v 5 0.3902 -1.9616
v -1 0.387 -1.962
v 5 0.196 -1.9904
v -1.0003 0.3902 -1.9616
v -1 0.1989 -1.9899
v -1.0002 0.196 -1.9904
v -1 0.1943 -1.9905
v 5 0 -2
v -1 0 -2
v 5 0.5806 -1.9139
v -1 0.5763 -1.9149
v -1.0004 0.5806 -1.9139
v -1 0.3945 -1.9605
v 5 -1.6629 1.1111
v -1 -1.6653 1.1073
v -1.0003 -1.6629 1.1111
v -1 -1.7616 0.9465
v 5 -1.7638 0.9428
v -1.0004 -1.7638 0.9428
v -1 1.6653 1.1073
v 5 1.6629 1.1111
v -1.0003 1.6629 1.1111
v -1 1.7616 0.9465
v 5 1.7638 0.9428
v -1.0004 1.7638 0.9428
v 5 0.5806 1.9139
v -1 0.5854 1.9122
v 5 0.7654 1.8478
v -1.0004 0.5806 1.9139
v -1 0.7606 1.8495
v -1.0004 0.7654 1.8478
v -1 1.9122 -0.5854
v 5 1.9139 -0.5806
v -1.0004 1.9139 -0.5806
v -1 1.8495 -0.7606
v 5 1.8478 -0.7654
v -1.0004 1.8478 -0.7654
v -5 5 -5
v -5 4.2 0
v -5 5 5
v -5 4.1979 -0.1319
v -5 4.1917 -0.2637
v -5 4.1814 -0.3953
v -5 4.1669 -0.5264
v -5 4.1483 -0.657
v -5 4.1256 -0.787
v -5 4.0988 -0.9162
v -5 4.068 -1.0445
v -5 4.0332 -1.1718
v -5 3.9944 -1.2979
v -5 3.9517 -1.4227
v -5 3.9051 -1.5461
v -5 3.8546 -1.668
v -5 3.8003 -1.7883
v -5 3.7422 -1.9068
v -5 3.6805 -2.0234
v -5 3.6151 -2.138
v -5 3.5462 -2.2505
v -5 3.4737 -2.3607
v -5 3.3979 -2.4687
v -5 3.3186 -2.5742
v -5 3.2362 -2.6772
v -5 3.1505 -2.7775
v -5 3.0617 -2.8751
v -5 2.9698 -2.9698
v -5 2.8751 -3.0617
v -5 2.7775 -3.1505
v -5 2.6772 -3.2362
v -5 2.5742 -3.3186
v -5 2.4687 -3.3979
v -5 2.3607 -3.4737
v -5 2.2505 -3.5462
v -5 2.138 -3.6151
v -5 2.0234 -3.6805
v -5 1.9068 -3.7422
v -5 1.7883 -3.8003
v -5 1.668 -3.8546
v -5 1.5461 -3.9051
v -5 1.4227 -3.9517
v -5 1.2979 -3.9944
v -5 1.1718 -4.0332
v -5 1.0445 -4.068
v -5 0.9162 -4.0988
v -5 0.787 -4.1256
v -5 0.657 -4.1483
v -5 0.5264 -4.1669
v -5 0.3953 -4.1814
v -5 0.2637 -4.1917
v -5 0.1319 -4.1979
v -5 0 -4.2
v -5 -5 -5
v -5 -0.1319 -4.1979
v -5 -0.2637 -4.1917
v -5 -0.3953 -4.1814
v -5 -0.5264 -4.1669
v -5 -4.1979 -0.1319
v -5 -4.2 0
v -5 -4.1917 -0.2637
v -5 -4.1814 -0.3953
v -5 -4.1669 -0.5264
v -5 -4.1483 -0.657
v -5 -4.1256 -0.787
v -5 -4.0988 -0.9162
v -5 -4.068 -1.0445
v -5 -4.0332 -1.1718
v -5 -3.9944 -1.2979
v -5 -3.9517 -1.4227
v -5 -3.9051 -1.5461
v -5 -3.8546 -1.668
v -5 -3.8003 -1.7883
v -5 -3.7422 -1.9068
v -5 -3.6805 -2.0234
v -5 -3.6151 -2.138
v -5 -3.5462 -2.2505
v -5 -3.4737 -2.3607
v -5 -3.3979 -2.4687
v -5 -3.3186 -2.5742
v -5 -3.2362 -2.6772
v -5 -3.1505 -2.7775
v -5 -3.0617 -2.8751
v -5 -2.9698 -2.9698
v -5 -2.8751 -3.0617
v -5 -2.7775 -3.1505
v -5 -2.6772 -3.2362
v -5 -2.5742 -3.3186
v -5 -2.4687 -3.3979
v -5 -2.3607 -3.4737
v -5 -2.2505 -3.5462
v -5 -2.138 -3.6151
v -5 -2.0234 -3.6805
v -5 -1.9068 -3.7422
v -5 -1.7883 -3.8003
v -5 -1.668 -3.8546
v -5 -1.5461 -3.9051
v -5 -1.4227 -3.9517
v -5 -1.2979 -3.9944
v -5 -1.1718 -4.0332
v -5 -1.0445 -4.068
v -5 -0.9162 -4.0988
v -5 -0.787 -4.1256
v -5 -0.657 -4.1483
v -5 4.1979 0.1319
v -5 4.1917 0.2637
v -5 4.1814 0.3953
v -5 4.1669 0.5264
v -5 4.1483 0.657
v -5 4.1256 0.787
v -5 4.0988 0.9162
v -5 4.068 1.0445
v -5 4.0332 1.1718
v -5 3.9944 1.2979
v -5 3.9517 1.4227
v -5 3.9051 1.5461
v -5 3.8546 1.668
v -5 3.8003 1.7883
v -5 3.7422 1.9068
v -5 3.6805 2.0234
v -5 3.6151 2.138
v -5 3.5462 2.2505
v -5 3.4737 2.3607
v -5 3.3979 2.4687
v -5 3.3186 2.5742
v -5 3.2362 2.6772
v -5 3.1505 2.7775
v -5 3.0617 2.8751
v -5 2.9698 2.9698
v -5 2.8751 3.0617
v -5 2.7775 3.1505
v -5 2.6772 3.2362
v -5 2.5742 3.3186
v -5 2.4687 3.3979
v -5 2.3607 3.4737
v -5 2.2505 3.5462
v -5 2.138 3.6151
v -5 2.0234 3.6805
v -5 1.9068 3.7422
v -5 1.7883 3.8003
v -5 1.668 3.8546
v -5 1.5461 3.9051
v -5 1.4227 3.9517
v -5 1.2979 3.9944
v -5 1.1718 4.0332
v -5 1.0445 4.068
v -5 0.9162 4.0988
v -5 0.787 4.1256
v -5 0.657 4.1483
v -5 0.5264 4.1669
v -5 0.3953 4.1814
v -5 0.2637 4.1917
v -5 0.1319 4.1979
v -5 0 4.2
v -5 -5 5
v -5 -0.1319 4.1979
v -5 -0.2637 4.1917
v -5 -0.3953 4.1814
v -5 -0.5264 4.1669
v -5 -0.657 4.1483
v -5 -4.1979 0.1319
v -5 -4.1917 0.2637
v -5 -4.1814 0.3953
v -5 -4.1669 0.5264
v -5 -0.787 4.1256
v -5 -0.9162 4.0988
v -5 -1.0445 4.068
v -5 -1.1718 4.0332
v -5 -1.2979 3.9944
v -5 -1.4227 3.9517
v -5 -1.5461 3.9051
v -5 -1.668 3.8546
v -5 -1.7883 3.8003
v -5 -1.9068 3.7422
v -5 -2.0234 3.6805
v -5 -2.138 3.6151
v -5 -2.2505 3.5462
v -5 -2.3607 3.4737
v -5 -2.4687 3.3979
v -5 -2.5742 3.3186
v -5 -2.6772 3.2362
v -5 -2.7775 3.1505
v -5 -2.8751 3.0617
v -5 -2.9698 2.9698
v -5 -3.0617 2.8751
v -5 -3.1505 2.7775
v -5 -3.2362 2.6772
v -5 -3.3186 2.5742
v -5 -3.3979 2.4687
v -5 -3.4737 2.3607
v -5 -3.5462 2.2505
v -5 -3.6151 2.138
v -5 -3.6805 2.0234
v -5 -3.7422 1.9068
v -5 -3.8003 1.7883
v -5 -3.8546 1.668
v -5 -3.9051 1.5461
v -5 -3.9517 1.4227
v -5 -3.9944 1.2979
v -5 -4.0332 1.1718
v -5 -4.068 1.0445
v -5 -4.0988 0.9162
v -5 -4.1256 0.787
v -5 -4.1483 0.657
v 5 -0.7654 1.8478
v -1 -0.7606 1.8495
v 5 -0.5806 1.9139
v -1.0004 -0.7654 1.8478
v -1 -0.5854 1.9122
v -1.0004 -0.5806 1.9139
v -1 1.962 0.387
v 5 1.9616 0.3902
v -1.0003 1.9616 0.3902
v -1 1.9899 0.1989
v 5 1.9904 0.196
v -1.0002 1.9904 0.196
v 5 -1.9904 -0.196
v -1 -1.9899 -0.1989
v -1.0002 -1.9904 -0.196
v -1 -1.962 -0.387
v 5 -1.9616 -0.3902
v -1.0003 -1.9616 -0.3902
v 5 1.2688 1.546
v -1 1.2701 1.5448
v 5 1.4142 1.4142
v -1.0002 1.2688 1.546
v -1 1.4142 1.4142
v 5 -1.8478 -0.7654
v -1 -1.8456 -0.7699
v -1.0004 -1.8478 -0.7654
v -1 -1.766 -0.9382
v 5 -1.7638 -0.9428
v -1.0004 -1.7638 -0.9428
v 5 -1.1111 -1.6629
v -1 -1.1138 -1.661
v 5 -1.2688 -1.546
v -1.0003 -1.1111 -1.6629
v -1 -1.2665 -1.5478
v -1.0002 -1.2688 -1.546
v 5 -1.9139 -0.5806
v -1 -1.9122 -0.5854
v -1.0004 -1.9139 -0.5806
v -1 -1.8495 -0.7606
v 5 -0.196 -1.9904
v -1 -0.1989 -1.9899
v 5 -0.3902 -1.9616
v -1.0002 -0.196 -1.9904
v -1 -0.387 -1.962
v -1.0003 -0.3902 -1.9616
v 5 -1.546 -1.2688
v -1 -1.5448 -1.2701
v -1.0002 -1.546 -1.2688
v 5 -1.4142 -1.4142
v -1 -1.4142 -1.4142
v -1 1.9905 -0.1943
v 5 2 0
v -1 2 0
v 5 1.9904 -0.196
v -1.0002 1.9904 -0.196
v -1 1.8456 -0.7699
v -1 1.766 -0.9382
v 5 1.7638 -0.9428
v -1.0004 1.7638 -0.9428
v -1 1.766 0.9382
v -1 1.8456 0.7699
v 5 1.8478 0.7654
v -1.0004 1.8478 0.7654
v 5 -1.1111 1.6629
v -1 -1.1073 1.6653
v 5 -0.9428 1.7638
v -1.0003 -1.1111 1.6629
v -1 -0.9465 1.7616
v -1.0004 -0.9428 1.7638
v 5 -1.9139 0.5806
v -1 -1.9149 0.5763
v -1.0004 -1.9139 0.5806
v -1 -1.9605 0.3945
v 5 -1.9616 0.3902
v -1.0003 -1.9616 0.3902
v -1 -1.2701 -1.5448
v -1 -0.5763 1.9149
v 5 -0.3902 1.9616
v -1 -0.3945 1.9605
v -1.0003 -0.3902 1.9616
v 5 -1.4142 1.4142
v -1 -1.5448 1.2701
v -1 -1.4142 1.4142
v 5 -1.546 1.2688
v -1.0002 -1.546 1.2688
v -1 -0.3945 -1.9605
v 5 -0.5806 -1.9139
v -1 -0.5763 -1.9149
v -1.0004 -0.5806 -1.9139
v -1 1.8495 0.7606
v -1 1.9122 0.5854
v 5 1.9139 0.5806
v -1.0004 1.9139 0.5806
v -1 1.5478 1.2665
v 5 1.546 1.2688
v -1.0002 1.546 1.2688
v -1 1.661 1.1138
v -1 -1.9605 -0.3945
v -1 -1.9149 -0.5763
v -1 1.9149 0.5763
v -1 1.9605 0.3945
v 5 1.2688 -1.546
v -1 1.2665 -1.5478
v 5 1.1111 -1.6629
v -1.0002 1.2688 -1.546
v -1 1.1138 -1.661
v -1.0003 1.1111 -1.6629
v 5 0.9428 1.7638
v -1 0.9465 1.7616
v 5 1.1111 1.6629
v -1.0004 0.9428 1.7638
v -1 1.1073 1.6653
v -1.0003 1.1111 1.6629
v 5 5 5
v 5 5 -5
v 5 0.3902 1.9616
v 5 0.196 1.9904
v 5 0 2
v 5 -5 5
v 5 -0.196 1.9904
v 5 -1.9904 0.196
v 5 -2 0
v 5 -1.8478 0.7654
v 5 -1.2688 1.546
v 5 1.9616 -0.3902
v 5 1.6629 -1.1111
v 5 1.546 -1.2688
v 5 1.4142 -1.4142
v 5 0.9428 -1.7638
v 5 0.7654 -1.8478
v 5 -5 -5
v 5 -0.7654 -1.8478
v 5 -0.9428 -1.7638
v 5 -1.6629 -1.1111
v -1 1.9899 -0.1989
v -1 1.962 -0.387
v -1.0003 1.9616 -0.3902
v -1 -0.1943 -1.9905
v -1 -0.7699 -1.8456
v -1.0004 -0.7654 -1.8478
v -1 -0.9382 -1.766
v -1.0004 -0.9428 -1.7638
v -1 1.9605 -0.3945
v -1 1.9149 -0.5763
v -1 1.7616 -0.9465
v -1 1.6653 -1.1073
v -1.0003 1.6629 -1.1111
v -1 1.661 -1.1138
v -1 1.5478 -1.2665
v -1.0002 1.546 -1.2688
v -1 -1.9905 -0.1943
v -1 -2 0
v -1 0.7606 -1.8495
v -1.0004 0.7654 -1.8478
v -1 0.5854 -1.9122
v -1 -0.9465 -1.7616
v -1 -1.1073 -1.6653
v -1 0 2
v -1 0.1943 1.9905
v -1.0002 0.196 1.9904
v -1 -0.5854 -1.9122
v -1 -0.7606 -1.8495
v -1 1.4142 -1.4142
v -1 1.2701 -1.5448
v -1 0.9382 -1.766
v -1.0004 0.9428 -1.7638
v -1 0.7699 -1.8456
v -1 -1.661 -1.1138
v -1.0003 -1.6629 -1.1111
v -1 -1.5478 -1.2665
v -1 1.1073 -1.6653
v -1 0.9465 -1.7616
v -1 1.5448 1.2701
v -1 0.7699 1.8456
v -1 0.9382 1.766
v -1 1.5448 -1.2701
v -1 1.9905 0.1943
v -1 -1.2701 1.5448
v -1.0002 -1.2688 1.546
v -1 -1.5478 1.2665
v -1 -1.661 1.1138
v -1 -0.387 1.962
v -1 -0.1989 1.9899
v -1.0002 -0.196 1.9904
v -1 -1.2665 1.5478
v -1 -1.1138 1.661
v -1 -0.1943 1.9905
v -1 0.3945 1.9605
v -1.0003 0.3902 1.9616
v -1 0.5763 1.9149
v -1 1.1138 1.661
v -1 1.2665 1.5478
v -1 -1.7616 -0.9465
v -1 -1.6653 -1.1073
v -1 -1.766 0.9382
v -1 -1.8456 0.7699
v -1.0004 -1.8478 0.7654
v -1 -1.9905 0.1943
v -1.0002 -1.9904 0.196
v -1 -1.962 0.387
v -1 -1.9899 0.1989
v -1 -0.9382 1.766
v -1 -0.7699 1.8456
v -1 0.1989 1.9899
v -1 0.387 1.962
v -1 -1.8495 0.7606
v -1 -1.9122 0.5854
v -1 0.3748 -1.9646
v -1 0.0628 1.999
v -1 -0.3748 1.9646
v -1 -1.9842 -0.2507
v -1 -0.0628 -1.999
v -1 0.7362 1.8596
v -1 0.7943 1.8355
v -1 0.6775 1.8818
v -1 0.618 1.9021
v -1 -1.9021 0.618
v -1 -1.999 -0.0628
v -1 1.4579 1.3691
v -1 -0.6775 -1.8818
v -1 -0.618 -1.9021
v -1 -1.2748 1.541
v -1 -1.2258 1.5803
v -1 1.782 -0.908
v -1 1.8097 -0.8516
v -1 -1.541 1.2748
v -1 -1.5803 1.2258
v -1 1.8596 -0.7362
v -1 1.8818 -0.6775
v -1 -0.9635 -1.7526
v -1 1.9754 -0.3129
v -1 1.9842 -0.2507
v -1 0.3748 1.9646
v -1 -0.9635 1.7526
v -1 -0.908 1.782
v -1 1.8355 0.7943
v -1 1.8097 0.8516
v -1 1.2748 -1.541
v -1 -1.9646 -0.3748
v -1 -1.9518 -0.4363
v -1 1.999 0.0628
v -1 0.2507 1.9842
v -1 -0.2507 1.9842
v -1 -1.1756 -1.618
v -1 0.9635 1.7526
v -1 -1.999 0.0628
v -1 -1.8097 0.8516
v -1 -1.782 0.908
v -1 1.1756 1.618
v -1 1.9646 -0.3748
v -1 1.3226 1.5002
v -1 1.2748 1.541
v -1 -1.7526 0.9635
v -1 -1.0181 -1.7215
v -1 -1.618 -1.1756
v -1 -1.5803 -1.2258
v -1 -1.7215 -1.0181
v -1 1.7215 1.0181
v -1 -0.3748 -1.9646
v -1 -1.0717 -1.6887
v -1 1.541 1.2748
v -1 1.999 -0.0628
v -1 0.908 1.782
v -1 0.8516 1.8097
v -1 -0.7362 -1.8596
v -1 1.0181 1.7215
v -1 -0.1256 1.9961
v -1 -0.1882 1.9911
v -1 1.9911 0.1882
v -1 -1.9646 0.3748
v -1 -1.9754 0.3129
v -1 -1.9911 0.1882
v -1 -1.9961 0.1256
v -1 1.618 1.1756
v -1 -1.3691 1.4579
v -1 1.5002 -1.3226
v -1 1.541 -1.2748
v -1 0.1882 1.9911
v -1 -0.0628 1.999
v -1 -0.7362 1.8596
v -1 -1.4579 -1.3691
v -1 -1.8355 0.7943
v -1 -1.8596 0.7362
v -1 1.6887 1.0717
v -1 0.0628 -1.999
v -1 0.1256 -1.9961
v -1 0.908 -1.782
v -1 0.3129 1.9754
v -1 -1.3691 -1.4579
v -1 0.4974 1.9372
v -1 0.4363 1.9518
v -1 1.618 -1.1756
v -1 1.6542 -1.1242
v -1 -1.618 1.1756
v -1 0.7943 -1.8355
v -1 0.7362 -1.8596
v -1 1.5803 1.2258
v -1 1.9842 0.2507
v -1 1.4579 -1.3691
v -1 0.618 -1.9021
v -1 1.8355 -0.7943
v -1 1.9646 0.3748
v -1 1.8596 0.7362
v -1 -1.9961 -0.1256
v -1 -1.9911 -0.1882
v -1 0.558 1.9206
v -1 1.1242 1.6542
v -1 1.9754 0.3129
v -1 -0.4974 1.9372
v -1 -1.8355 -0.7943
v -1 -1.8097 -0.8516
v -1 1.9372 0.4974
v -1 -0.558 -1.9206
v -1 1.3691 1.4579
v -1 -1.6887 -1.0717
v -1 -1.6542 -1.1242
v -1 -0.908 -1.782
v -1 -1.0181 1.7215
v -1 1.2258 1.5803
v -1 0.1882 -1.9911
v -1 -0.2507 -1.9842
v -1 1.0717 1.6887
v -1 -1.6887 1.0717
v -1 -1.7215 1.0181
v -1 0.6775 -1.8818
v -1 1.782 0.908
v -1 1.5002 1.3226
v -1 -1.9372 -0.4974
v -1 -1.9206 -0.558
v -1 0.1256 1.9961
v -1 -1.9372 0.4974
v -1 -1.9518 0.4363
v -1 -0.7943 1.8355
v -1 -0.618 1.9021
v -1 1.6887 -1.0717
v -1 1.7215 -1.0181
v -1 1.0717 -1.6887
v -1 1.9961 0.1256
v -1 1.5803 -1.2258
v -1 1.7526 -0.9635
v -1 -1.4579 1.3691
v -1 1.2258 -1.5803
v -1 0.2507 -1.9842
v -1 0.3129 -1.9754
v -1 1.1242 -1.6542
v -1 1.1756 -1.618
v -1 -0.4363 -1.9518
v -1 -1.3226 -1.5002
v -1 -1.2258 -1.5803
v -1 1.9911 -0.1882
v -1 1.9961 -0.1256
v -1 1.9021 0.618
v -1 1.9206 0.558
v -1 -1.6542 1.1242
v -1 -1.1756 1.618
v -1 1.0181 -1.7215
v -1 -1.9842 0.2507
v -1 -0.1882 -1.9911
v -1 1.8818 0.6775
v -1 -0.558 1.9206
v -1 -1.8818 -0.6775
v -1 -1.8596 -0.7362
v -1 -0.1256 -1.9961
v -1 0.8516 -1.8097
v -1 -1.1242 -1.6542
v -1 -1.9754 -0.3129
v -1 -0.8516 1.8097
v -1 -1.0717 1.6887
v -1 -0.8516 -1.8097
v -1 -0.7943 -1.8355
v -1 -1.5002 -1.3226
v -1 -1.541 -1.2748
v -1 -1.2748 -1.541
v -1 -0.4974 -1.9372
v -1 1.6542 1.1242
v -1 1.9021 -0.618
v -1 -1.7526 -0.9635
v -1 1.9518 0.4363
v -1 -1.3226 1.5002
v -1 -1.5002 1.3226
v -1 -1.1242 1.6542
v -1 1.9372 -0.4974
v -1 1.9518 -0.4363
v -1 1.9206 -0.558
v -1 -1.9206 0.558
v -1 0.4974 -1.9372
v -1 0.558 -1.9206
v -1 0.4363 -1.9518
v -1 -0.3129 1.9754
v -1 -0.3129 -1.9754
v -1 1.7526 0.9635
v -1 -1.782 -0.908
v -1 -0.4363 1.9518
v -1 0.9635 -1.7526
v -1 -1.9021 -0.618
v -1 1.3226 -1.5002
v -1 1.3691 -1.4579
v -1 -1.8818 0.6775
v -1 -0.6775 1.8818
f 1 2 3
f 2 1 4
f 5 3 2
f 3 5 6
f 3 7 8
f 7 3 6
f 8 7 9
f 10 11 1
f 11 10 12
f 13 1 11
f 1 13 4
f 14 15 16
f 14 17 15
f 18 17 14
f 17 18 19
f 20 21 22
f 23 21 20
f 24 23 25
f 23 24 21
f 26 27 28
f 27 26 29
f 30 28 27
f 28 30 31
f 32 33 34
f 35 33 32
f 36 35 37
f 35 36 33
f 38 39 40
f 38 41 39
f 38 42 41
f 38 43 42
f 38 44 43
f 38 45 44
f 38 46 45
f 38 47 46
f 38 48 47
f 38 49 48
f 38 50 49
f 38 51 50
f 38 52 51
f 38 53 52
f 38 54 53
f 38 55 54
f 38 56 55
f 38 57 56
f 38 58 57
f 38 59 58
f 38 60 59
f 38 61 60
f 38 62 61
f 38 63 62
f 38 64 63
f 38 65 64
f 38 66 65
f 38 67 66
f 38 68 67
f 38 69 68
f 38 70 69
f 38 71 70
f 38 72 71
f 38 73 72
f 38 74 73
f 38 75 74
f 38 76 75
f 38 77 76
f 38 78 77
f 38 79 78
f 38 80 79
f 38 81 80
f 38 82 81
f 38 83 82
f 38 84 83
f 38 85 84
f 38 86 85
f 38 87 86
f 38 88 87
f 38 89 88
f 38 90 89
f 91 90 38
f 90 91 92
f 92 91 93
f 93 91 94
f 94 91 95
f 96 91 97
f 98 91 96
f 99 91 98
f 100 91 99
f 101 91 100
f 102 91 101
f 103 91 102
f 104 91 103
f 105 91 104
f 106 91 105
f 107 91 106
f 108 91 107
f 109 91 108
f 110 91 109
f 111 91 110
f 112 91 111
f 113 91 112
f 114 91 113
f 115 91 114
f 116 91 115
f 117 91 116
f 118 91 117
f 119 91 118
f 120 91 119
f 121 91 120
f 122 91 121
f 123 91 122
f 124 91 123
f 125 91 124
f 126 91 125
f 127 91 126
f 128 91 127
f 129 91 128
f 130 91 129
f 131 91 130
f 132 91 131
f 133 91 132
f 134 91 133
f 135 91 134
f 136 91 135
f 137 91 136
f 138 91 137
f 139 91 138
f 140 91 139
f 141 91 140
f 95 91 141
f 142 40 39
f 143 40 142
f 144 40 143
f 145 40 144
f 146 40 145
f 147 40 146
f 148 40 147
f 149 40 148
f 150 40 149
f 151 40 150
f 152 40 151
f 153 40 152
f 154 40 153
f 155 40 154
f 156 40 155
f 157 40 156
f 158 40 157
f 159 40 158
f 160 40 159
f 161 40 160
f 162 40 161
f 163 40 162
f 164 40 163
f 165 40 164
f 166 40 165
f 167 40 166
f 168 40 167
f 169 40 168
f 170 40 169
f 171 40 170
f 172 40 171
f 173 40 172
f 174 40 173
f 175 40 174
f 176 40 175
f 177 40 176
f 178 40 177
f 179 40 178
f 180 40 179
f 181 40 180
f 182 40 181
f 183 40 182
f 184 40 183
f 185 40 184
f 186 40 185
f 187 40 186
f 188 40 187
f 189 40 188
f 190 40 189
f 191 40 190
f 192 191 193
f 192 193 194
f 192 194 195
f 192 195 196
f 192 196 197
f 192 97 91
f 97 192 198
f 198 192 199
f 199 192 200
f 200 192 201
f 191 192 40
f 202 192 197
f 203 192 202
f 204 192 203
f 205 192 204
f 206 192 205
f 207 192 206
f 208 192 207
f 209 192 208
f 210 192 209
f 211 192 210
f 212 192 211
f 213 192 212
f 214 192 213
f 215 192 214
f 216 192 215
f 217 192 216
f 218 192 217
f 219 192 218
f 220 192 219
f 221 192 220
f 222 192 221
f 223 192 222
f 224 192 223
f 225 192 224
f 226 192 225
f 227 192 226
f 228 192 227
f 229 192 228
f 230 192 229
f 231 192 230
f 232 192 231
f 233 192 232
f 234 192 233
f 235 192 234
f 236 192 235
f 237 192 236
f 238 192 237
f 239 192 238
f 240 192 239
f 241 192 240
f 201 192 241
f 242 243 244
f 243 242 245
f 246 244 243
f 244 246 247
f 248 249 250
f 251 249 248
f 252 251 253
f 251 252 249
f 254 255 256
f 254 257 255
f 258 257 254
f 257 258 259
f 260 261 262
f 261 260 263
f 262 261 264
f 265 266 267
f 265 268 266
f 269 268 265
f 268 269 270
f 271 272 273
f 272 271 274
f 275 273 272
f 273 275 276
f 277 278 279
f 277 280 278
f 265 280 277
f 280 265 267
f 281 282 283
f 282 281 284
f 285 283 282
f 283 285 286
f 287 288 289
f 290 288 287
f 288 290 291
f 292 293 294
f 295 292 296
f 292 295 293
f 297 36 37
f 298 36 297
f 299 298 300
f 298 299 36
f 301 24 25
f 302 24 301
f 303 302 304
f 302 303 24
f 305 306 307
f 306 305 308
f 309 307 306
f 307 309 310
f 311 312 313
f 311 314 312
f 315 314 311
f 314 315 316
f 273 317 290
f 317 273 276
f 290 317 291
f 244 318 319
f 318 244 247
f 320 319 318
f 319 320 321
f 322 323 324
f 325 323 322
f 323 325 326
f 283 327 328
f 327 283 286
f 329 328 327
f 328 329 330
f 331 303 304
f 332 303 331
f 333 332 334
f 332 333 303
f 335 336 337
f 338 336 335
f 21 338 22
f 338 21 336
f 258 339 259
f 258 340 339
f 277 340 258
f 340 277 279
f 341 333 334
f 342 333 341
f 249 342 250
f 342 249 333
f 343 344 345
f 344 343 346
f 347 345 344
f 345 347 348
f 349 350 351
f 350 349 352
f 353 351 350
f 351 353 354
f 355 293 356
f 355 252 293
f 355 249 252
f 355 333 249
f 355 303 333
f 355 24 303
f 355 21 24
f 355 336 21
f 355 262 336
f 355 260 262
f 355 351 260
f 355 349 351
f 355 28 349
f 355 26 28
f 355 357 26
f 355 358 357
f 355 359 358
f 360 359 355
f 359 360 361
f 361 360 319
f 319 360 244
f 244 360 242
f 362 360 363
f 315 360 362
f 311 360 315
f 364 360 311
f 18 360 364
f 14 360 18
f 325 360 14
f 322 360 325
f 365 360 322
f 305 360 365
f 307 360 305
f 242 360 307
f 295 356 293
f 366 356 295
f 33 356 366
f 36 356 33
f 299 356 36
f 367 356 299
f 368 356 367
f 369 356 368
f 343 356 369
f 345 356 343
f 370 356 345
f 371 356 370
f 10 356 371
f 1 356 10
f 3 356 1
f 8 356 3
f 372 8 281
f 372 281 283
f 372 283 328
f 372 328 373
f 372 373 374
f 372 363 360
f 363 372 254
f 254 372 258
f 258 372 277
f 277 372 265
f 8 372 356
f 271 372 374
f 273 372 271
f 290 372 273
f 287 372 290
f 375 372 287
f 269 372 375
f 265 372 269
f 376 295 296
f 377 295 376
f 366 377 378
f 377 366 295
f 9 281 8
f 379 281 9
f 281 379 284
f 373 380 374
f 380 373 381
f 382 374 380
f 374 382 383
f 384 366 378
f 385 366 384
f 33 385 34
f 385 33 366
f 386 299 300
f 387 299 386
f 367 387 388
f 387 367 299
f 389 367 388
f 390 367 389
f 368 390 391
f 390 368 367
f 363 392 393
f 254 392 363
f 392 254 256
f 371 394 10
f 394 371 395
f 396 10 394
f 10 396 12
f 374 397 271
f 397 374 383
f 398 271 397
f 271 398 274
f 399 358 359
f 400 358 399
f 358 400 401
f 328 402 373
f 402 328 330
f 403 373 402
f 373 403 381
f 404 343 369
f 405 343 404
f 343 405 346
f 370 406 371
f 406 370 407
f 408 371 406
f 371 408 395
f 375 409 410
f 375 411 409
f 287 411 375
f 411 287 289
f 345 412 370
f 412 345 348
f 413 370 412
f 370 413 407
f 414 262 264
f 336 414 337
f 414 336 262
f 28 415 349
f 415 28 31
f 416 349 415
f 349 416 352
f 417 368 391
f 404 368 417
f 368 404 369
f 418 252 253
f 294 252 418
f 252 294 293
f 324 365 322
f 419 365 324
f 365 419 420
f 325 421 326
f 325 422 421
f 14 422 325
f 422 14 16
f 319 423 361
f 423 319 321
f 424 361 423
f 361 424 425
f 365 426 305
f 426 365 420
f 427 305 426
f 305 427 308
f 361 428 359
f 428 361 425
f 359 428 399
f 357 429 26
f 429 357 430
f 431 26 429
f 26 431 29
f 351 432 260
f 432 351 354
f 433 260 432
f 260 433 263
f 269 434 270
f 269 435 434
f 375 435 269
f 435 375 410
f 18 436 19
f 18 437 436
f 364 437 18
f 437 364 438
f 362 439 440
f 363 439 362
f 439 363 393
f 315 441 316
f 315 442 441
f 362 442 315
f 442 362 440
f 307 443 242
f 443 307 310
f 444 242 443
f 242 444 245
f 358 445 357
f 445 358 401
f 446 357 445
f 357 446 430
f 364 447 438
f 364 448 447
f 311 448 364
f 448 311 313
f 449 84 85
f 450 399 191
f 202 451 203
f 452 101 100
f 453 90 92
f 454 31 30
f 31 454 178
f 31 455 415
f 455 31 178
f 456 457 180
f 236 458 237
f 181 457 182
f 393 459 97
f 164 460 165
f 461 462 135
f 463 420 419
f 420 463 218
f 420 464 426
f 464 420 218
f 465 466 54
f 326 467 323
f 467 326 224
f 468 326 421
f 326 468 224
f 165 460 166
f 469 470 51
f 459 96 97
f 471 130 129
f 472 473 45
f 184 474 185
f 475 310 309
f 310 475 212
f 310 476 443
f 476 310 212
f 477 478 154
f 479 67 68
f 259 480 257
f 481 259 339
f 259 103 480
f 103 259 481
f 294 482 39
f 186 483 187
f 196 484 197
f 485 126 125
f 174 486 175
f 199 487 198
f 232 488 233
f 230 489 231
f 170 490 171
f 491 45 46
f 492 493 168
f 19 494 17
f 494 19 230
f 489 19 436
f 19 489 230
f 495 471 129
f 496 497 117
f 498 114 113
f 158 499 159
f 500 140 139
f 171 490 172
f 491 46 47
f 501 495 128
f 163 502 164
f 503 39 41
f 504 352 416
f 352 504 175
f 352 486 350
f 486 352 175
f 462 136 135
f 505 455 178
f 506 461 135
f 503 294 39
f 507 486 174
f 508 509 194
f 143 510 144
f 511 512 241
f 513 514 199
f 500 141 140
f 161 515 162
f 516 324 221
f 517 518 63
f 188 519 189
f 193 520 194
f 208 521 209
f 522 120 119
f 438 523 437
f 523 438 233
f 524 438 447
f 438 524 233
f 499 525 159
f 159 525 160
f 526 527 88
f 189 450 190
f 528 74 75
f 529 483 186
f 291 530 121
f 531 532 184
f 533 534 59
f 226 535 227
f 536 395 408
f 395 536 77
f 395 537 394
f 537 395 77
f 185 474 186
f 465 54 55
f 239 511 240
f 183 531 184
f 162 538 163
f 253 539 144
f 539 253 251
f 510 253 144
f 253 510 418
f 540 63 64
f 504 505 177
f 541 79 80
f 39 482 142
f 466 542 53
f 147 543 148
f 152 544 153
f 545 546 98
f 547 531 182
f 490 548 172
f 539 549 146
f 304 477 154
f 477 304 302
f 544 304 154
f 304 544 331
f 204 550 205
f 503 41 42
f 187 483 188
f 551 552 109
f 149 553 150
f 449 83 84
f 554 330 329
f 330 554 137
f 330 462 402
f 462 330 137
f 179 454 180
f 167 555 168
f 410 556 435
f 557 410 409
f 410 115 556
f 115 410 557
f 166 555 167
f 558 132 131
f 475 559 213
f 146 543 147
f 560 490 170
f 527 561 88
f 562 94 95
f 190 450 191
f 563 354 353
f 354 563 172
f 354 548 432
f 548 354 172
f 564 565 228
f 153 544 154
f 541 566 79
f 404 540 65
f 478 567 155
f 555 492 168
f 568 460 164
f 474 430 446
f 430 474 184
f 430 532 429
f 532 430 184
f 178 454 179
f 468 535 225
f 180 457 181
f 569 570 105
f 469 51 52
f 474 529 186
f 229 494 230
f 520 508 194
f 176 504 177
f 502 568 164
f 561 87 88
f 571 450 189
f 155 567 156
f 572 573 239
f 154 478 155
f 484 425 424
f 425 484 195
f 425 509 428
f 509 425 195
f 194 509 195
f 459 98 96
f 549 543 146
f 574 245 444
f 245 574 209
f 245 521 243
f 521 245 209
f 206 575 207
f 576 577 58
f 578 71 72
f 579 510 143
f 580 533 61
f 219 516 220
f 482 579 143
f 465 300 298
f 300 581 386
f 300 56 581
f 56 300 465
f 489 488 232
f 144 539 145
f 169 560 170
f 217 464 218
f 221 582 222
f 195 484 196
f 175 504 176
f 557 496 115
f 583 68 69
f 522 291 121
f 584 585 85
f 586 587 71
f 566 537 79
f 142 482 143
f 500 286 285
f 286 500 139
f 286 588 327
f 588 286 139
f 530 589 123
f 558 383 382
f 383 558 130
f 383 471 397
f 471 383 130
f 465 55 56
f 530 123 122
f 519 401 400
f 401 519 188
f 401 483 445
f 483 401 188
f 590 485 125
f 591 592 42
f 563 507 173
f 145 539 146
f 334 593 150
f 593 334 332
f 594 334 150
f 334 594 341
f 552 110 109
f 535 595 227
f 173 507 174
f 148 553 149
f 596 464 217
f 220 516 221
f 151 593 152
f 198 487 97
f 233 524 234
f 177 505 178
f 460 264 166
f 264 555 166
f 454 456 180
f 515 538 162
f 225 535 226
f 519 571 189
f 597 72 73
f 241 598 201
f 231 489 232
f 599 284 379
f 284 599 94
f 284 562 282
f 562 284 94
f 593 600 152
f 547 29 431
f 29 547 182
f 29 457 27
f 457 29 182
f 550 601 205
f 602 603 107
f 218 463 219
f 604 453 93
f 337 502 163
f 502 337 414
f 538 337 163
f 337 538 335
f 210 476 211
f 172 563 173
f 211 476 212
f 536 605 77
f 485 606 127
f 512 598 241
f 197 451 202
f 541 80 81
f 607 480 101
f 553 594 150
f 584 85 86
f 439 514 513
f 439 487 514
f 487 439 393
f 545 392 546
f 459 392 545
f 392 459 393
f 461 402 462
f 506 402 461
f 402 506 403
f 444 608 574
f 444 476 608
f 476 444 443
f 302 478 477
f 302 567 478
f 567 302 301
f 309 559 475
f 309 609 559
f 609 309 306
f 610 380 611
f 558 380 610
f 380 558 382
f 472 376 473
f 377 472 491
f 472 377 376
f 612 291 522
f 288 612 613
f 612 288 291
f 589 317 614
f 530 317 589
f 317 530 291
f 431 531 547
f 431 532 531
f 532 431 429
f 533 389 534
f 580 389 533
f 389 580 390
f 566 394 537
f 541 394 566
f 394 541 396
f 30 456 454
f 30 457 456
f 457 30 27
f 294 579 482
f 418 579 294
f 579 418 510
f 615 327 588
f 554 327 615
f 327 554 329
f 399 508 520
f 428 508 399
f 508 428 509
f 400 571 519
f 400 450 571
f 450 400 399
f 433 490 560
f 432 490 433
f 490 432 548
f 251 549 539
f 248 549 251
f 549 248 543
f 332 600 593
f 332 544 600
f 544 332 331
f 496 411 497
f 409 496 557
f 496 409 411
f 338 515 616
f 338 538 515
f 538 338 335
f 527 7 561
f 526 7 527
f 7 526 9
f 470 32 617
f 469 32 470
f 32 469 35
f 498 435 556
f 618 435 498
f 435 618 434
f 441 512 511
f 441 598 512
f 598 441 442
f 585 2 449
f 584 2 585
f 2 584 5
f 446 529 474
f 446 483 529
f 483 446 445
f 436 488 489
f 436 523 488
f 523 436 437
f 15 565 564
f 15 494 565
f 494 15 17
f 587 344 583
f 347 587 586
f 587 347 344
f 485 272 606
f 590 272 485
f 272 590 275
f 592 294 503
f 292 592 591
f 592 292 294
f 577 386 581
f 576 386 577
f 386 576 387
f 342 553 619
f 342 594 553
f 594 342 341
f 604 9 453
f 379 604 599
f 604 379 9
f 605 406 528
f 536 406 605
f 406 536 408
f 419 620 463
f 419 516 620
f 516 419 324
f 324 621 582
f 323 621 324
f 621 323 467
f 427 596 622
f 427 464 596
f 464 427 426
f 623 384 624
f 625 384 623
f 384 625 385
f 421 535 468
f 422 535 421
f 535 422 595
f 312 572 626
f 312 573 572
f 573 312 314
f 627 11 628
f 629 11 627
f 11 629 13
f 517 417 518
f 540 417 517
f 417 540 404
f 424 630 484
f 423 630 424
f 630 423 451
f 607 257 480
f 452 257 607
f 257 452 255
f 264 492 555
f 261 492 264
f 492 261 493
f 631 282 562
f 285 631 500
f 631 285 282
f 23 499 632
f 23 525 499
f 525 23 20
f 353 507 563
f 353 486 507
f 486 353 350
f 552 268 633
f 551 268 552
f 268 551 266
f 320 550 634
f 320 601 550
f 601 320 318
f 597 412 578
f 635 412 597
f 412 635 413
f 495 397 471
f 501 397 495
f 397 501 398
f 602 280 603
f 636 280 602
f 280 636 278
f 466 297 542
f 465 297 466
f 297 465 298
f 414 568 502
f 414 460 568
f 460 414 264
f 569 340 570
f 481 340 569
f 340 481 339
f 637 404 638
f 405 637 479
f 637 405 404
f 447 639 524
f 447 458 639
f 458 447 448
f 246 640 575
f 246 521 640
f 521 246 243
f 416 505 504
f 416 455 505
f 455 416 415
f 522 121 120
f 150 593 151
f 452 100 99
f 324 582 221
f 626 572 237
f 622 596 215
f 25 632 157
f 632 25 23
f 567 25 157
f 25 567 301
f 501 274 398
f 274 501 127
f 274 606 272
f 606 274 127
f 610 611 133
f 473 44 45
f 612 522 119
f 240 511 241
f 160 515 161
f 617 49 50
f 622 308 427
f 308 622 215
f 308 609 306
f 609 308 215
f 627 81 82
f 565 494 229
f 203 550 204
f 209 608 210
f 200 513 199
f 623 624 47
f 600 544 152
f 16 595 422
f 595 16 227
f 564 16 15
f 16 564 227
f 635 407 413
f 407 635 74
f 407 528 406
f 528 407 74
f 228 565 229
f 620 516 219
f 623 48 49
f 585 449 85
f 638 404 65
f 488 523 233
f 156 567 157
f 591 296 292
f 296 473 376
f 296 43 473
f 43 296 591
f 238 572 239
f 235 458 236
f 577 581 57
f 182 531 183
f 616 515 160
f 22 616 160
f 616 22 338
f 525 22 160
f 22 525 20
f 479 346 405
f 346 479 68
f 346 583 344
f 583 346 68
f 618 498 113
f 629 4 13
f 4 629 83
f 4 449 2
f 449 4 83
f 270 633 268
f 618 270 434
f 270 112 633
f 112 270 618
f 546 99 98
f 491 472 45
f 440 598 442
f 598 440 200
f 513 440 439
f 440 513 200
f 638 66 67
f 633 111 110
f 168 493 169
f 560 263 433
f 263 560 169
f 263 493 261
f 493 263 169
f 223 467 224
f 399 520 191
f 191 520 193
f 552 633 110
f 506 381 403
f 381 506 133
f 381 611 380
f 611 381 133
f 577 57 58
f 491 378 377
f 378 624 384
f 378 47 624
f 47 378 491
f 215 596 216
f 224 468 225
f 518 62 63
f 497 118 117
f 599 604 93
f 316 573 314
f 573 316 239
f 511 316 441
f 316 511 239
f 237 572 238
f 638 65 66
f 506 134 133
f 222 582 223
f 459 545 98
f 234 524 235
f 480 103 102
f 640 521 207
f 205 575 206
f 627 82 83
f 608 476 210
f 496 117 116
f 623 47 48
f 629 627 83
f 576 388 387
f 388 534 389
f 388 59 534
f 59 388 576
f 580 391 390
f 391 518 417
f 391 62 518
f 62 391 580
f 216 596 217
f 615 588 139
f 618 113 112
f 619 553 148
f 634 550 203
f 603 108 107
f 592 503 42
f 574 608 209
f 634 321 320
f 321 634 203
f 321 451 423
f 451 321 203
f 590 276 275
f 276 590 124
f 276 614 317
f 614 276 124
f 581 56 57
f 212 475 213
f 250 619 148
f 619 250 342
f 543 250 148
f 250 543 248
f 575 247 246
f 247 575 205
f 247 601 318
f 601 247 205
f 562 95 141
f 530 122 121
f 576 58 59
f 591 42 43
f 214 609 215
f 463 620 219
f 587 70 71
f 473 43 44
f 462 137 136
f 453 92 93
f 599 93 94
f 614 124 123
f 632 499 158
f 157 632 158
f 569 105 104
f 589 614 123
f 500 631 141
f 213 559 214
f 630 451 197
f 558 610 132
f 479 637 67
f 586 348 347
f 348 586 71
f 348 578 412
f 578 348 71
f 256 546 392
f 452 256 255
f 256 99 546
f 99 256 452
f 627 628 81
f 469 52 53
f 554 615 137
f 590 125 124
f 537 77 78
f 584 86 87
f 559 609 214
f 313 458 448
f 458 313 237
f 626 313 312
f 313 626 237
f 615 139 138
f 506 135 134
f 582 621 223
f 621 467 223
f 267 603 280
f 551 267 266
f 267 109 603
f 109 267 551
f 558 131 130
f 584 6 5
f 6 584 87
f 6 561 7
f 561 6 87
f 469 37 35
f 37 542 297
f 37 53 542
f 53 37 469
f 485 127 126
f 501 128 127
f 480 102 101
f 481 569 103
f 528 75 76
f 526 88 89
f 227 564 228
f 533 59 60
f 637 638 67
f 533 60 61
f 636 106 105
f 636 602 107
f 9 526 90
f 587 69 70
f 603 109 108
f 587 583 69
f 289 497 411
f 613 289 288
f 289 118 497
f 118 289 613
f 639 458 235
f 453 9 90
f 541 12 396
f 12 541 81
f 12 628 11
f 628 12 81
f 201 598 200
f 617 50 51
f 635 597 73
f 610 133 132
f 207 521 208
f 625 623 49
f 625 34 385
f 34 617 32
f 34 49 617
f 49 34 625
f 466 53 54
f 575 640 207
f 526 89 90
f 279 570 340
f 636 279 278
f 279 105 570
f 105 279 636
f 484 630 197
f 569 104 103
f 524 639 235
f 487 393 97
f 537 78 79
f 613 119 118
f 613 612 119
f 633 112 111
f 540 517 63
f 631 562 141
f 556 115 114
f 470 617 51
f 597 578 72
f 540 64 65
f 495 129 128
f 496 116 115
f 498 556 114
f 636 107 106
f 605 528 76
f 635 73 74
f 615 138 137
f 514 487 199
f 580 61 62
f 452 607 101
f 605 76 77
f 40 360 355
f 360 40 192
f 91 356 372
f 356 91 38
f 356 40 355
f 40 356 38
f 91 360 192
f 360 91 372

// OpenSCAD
module countersink(top_radius, hole_radius, sink_depth)
{

      rotate_extrude($fn=200) 
      polygon([[0,0],[top_radius,0],[hole_radius,sink_depth],[0,sink_depth]]);
}


module deckscrew(depth=40)
{
  head_r=4.2;
  head_depth=4;
  screwhole_r=2;
  
  rotate([0,90,0])
  {
    cylinder(r=screwhole_r,h=depth,center=true,$fn=64);
    translate([0,0,-depth/2])countersink(head_r, screwhole_r, head_depth);
  }
}

difference()
{
  cube([10,10,10],center=true);
  deckscrew(10);
}
